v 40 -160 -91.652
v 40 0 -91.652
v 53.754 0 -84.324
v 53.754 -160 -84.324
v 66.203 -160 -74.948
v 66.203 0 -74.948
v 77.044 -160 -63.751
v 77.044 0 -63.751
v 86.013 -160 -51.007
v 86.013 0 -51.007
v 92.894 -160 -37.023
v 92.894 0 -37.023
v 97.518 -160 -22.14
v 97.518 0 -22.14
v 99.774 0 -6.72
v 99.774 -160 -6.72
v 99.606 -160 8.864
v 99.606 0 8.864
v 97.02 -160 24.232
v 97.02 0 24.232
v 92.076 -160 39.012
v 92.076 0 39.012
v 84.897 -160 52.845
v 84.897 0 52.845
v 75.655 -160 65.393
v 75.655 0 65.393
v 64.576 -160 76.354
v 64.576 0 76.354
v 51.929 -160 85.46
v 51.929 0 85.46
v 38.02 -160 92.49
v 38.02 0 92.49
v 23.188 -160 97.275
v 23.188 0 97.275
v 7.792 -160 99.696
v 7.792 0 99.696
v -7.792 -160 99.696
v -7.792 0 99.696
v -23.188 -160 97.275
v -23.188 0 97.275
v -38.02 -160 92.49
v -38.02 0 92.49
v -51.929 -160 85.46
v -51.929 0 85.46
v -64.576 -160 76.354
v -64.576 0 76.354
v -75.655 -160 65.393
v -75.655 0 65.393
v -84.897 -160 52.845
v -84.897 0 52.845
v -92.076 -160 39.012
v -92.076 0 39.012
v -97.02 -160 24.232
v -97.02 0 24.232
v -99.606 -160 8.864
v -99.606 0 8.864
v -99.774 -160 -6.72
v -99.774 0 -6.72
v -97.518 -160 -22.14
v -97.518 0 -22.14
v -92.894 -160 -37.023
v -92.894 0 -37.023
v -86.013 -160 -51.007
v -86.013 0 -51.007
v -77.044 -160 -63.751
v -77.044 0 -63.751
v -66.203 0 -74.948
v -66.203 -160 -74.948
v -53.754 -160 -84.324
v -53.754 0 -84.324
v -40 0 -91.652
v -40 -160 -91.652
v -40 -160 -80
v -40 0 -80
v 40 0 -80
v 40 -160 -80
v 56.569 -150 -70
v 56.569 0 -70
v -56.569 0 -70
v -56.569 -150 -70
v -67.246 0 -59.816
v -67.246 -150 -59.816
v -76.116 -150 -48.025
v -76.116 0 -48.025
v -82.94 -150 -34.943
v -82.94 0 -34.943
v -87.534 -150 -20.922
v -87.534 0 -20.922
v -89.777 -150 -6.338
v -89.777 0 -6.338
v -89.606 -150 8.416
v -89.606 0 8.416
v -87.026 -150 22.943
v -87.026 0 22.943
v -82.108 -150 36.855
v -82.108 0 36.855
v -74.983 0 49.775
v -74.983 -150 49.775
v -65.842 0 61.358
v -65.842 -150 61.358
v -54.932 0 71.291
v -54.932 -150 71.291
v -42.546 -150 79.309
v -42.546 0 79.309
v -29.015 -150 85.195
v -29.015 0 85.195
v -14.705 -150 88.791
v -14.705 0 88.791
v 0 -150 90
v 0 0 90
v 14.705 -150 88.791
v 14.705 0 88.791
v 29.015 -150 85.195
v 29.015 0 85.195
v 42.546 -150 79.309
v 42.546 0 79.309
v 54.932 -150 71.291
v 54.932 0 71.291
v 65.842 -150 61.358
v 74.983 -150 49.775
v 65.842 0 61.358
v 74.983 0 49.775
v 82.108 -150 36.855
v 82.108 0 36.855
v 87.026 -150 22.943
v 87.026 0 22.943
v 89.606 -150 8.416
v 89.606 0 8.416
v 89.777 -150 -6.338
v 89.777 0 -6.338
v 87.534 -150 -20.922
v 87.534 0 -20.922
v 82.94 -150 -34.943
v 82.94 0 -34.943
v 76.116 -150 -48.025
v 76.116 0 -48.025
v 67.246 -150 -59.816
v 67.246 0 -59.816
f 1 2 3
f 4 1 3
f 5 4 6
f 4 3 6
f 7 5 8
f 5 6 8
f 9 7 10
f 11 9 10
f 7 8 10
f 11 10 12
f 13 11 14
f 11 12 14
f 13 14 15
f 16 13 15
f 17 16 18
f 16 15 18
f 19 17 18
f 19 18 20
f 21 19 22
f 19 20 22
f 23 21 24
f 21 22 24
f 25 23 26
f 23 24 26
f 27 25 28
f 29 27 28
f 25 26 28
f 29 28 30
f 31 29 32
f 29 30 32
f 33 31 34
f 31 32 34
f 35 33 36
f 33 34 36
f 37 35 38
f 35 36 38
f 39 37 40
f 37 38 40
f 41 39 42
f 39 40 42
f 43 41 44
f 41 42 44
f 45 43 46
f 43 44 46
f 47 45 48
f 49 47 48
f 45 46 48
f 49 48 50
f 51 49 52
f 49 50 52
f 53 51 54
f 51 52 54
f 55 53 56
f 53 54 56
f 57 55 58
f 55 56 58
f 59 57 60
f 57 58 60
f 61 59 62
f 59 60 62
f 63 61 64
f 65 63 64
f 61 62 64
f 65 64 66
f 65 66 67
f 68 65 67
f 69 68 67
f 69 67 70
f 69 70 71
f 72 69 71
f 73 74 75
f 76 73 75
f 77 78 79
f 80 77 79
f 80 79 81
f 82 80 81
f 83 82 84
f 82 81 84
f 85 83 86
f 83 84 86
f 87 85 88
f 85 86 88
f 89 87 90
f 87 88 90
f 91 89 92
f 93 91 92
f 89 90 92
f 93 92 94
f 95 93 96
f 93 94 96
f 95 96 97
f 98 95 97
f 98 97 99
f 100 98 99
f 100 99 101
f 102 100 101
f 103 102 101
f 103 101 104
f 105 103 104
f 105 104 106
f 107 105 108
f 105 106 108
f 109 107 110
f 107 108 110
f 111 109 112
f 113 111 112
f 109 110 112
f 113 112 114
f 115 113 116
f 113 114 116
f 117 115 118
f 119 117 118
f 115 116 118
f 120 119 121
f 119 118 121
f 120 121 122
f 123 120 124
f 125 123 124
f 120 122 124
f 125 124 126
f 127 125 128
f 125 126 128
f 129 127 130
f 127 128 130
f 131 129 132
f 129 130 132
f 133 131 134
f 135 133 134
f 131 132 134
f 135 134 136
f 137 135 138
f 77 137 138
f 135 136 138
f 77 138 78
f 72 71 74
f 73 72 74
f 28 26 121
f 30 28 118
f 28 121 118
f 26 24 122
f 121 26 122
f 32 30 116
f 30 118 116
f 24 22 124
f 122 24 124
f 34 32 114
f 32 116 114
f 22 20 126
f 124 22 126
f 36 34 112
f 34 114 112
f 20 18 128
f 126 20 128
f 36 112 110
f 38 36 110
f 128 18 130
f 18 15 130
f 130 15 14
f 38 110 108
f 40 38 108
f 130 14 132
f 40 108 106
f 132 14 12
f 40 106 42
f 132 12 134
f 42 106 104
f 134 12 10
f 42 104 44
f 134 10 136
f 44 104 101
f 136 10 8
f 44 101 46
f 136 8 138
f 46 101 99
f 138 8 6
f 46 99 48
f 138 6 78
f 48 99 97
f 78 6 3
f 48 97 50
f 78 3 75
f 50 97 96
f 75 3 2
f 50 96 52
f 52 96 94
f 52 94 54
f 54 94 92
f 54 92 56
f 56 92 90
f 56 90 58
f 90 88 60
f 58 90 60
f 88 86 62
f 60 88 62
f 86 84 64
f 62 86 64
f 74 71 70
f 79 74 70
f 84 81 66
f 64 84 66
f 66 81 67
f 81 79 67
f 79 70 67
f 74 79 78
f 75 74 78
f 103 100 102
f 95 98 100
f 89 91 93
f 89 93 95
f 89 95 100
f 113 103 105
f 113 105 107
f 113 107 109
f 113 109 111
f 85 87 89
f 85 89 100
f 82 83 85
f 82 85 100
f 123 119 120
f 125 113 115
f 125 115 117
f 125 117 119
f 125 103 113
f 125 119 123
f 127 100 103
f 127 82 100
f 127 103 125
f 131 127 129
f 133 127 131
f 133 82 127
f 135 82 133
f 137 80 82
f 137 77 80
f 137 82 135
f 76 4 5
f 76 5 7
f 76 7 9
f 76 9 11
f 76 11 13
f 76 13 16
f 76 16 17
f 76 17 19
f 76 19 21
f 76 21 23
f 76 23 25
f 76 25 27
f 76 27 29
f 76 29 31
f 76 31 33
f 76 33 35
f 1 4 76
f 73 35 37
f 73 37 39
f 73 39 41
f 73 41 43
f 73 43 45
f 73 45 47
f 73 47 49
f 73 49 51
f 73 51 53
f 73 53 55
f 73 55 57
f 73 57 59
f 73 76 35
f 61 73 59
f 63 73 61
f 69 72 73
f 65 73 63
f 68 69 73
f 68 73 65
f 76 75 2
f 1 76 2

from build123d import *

# Parameters (mm, degrees)
BOSS_EXTRUDE1_DEPTH = 160
CUT_EXTRUDE1_DEPTH  = 150


with BuildPart() as part:
    # Sketch1 → Boss-Extrude1 (new body)
    with BuildSketch(Plane(origin=(0, 0, 0), x_dir=(1, 0, 0), z_dir=(0, 1, 0))):
        with BuildLine():
            Line((-40, 91.651513899), (-40, 80))
            Line((-40, 80), (40, 80))
            Line((40, 80), (40, 91.651513899))
            ThreePointArc((40, 91.651513899), (0, -100), (-40, 91.651513899))
        make_face()
    extrude(amount=-BOSS_EXTRUDE1_DEPTH)

    # Sketch2 → Cut-Extrude1 (cut)
    with BuildSketch(Plane(origin=(0, 0, 0), x_dir=(1, 0, 0), z_dir=(0, 1, 0))):
        with BuildLine():
            Line((50, 70), (-50, 70))
            Line((-50, 70), (-56.568542495, 70))
            ThreePointArc((-56.568542495, 70), (0, -90), (56.568542495, 70))
            Line((56.568542495, 70), (50, 70))
        make_face()
    extrude(amount=-CUT_EXTRUDE1_DEPTH, mode=Mode.SUBTRACT)


solid = part.part
